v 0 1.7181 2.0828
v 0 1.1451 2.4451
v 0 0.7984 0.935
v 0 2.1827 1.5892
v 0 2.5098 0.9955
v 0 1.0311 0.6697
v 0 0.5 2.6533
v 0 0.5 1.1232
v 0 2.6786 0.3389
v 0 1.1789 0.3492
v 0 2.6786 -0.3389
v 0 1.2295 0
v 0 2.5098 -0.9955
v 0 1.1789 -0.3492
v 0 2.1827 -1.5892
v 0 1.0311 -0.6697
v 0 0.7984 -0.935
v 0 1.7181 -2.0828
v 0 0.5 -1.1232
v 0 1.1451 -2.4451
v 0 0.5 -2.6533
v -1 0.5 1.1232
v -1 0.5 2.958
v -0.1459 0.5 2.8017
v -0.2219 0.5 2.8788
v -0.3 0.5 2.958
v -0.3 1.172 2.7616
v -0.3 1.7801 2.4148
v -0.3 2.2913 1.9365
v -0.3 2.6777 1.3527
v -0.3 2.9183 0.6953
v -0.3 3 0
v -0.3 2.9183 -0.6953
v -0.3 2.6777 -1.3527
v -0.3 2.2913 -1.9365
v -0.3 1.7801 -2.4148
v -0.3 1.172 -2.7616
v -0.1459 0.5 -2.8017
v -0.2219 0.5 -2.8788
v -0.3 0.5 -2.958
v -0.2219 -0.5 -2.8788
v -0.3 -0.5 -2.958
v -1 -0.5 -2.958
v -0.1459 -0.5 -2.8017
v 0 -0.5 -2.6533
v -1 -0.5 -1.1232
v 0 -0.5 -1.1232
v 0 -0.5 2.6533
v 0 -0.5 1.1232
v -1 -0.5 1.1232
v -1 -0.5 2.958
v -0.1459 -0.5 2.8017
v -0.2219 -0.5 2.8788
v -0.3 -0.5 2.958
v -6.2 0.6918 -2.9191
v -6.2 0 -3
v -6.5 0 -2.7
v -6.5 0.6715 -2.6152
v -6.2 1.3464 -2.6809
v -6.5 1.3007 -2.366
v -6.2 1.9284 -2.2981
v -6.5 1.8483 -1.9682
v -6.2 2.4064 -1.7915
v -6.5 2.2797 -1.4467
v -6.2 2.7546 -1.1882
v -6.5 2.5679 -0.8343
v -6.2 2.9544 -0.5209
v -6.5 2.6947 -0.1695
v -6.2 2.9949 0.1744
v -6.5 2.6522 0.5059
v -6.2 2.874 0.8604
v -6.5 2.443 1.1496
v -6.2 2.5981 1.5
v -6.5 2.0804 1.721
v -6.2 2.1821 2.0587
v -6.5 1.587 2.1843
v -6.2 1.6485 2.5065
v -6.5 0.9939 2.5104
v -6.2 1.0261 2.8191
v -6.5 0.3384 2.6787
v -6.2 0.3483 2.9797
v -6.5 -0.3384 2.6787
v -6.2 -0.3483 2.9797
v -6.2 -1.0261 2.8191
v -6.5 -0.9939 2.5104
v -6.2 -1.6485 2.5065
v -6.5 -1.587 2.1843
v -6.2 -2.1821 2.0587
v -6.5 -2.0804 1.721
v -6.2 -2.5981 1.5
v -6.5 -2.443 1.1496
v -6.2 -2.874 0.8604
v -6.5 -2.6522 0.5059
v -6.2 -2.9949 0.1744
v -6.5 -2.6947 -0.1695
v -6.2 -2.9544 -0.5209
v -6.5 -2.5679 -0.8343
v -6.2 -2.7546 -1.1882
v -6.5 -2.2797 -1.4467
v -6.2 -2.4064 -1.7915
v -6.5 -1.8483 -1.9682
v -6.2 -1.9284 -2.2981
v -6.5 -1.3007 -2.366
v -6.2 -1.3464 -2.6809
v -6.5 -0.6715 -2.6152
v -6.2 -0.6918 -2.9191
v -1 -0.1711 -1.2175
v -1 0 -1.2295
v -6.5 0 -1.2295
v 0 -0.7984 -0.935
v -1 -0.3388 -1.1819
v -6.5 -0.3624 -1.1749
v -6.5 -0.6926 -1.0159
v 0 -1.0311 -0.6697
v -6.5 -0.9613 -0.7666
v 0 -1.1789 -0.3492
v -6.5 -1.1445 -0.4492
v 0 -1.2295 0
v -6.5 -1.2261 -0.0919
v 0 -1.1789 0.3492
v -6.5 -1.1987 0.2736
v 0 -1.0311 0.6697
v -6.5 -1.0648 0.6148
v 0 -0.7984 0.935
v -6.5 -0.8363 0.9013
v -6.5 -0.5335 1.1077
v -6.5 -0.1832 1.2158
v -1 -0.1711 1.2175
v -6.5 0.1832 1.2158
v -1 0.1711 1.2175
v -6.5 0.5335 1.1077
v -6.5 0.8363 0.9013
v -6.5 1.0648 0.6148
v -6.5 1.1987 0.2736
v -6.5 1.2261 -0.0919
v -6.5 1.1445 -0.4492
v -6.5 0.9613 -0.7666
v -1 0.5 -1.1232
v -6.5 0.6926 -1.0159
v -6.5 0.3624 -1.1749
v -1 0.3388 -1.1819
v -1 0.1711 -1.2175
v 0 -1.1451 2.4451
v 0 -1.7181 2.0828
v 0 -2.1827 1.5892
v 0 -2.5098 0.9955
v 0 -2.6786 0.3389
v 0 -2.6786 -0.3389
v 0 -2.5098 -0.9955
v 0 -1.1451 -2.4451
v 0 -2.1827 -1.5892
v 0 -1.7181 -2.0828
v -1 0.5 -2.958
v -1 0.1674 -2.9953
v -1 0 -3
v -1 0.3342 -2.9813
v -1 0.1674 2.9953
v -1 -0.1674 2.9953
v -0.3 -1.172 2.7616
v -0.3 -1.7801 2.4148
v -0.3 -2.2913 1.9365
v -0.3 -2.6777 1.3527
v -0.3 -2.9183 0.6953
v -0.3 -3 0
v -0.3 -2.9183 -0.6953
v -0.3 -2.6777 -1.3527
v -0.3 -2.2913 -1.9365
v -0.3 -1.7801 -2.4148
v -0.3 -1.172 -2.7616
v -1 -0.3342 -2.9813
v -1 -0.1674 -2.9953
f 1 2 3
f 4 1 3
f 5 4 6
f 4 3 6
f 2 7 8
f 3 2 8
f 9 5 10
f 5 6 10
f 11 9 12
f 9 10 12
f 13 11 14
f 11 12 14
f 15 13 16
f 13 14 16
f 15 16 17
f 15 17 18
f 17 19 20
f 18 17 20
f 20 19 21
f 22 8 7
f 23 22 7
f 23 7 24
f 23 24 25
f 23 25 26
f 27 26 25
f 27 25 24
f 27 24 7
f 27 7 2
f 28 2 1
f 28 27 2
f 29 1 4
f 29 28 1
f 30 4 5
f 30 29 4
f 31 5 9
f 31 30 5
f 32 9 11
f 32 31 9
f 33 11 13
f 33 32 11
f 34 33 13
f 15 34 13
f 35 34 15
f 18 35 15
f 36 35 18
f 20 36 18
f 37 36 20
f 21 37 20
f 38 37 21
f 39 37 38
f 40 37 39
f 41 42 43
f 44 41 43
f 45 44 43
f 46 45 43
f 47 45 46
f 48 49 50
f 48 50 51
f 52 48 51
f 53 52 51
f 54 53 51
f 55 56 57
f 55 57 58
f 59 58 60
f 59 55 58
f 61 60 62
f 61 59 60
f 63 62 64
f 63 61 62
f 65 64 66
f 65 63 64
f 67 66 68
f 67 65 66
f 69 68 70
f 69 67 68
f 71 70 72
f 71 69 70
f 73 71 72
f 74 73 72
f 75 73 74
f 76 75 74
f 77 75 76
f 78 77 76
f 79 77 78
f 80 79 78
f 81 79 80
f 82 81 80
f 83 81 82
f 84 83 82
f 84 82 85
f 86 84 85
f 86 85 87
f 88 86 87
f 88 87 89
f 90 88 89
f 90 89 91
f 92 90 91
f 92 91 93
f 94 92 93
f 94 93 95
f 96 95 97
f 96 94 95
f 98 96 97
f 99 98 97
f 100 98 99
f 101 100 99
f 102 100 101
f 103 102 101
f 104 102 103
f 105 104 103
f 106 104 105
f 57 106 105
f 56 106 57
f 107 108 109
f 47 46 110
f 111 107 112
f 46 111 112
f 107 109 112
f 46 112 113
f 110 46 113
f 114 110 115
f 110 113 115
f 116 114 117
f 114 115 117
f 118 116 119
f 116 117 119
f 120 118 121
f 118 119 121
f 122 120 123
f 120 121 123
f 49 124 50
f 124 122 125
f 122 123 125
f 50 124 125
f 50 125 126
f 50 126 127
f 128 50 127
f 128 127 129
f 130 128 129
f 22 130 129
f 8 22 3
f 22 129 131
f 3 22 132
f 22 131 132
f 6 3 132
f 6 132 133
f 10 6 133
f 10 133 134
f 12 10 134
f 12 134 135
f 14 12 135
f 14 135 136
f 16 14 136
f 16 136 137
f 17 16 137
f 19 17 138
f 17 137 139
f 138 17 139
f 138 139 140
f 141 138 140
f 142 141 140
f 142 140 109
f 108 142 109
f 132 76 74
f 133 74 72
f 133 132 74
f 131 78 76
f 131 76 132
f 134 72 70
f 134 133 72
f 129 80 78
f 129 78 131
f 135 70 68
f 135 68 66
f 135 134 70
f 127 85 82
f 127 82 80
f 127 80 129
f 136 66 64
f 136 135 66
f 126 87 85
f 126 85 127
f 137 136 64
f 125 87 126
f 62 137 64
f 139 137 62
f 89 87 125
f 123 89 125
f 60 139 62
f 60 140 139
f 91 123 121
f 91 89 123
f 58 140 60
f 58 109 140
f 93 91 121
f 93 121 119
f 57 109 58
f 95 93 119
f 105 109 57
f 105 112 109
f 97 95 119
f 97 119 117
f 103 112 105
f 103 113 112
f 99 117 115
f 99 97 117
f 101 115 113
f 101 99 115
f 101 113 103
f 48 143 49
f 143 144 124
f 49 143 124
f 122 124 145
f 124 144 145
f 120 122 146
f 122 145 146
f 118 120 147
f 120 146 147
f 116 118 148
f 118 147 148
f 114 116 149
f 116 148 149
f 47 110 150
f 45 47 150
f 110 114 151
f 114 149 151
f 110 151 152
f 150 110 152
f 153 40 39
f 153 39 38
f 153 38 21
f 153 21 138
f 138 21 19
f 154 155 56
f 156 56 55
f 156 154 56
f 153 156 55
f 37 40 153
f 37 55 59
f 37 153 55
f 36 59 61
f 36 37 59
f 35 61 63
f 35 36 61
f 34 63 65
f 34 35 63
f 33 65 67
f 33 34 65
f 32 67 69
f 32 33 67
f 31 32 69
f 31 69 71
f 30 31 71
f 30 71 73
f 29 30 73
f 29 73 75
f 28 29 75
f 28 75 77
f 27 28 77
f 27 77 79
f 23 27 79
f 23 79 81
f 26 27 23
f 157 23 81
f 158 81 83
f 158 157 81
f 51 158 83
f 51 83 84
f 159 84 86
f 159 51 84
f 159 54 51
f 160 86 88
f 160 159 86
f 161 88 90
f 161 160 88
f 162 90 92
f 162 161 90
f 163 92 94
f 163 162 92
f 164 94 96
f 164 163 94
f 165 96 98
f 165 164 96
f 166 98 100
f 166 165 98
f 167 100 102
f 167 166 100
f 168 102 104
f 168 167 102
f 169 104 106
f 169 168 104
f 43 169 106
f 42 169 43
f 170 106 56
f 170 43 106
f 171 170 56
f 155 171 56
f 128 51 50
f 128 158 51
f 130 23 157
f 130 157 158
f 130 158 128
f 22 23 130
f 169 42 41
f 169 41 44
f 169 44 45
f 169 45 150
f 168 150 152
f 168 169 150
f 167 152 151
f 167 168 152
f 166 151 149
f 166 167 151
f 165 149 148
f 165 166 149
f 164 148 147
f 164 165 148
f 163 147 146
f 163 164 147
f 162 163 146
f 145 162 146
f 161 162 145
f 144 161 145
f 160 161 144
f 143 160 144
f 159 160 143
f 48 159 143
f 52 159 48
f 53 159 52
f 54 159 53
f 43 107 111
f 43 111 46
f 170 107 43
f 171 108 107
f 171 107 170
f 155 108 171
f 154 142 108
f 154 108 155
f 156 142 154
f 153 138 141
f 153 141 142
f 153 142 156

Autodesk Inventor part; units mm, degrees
ref_plane "YZ Plane" through (0, 0, 0) normal (1, 0, 0) x (0, 1, 0)
ref_plane "XZ Plane" through (0, 0, 0) normal (0, 1, 0) x (-1, 0, 0)
ref_plane "XY Plane" through (0, 0, 0) normal (0, 0, 1) x (1, 0, 0)
sketch "スケッチ1" plane through (0, 0, 0) normal (0, 1, 0) x (-1, 0, 0)
  line L0 (0, 0) -> (6.5, 0)
  line L1 (6.5, 0) -> (6.5, -3)
  line L2 (6.5, -3) -> (0, -3)
  line L3 (0, -3) -> (0, 0)
  dimension "d0" = 6.5
  dimension "d1" = 3
revolve "回転1" add sketch "スケッチ1" angle 360 about axis through (0, 0, 0) along (-1, 0, 0)
sketch "スケッチ2" plane through (0, 0, 0) normal (1, 0, 0) x (0, 0, -1)
  point P0 (0, 0)
  point P1 (0, 0)
hole "穴1" at (0, 0, 0) direction (-1, 0, 0) diameter 2.459 end through all thread size "M3x0.5" class "6H" standard "ANSI Metric M Profile"
sketch "スケッチ3" plane through (0, 0, 0) normal (1, 0, 0) x (0, 0, -1)
  circle A0 centre (0, 0) radius 3 projected
  line L0 (3, 0) -> (-3, 0)
  line L1 (3, -0.5) -> (-3, -0.5)
  line L2 (3, 0.5) -> (-3, 0.5)
  line L3 (3, 0.5) -> (3, -0.5)
  line L4 (-3, 0.5) -> (-3, -0.5)
  point P0 (-2.958, -0.5)
  point P1 (2.958, -0.5)
  point P2 (2.958, 0.5)
  point P3 (-2.958, 0.5)
  dimension "d10" = 0.5
extrude "押し出し1" cut sketch "スケッチ3" against normal blind 1 contours L0 A0 L2 | A0 L1 L0
chamfer "面取り1" distance 0.3 angle 45 3 edges at (-6.5, 0, 3) (0, 3, 0) (0, -3, 0)
properties part number "ARU-306_5SMO" material "ステンレス鋼 AISI 304"
